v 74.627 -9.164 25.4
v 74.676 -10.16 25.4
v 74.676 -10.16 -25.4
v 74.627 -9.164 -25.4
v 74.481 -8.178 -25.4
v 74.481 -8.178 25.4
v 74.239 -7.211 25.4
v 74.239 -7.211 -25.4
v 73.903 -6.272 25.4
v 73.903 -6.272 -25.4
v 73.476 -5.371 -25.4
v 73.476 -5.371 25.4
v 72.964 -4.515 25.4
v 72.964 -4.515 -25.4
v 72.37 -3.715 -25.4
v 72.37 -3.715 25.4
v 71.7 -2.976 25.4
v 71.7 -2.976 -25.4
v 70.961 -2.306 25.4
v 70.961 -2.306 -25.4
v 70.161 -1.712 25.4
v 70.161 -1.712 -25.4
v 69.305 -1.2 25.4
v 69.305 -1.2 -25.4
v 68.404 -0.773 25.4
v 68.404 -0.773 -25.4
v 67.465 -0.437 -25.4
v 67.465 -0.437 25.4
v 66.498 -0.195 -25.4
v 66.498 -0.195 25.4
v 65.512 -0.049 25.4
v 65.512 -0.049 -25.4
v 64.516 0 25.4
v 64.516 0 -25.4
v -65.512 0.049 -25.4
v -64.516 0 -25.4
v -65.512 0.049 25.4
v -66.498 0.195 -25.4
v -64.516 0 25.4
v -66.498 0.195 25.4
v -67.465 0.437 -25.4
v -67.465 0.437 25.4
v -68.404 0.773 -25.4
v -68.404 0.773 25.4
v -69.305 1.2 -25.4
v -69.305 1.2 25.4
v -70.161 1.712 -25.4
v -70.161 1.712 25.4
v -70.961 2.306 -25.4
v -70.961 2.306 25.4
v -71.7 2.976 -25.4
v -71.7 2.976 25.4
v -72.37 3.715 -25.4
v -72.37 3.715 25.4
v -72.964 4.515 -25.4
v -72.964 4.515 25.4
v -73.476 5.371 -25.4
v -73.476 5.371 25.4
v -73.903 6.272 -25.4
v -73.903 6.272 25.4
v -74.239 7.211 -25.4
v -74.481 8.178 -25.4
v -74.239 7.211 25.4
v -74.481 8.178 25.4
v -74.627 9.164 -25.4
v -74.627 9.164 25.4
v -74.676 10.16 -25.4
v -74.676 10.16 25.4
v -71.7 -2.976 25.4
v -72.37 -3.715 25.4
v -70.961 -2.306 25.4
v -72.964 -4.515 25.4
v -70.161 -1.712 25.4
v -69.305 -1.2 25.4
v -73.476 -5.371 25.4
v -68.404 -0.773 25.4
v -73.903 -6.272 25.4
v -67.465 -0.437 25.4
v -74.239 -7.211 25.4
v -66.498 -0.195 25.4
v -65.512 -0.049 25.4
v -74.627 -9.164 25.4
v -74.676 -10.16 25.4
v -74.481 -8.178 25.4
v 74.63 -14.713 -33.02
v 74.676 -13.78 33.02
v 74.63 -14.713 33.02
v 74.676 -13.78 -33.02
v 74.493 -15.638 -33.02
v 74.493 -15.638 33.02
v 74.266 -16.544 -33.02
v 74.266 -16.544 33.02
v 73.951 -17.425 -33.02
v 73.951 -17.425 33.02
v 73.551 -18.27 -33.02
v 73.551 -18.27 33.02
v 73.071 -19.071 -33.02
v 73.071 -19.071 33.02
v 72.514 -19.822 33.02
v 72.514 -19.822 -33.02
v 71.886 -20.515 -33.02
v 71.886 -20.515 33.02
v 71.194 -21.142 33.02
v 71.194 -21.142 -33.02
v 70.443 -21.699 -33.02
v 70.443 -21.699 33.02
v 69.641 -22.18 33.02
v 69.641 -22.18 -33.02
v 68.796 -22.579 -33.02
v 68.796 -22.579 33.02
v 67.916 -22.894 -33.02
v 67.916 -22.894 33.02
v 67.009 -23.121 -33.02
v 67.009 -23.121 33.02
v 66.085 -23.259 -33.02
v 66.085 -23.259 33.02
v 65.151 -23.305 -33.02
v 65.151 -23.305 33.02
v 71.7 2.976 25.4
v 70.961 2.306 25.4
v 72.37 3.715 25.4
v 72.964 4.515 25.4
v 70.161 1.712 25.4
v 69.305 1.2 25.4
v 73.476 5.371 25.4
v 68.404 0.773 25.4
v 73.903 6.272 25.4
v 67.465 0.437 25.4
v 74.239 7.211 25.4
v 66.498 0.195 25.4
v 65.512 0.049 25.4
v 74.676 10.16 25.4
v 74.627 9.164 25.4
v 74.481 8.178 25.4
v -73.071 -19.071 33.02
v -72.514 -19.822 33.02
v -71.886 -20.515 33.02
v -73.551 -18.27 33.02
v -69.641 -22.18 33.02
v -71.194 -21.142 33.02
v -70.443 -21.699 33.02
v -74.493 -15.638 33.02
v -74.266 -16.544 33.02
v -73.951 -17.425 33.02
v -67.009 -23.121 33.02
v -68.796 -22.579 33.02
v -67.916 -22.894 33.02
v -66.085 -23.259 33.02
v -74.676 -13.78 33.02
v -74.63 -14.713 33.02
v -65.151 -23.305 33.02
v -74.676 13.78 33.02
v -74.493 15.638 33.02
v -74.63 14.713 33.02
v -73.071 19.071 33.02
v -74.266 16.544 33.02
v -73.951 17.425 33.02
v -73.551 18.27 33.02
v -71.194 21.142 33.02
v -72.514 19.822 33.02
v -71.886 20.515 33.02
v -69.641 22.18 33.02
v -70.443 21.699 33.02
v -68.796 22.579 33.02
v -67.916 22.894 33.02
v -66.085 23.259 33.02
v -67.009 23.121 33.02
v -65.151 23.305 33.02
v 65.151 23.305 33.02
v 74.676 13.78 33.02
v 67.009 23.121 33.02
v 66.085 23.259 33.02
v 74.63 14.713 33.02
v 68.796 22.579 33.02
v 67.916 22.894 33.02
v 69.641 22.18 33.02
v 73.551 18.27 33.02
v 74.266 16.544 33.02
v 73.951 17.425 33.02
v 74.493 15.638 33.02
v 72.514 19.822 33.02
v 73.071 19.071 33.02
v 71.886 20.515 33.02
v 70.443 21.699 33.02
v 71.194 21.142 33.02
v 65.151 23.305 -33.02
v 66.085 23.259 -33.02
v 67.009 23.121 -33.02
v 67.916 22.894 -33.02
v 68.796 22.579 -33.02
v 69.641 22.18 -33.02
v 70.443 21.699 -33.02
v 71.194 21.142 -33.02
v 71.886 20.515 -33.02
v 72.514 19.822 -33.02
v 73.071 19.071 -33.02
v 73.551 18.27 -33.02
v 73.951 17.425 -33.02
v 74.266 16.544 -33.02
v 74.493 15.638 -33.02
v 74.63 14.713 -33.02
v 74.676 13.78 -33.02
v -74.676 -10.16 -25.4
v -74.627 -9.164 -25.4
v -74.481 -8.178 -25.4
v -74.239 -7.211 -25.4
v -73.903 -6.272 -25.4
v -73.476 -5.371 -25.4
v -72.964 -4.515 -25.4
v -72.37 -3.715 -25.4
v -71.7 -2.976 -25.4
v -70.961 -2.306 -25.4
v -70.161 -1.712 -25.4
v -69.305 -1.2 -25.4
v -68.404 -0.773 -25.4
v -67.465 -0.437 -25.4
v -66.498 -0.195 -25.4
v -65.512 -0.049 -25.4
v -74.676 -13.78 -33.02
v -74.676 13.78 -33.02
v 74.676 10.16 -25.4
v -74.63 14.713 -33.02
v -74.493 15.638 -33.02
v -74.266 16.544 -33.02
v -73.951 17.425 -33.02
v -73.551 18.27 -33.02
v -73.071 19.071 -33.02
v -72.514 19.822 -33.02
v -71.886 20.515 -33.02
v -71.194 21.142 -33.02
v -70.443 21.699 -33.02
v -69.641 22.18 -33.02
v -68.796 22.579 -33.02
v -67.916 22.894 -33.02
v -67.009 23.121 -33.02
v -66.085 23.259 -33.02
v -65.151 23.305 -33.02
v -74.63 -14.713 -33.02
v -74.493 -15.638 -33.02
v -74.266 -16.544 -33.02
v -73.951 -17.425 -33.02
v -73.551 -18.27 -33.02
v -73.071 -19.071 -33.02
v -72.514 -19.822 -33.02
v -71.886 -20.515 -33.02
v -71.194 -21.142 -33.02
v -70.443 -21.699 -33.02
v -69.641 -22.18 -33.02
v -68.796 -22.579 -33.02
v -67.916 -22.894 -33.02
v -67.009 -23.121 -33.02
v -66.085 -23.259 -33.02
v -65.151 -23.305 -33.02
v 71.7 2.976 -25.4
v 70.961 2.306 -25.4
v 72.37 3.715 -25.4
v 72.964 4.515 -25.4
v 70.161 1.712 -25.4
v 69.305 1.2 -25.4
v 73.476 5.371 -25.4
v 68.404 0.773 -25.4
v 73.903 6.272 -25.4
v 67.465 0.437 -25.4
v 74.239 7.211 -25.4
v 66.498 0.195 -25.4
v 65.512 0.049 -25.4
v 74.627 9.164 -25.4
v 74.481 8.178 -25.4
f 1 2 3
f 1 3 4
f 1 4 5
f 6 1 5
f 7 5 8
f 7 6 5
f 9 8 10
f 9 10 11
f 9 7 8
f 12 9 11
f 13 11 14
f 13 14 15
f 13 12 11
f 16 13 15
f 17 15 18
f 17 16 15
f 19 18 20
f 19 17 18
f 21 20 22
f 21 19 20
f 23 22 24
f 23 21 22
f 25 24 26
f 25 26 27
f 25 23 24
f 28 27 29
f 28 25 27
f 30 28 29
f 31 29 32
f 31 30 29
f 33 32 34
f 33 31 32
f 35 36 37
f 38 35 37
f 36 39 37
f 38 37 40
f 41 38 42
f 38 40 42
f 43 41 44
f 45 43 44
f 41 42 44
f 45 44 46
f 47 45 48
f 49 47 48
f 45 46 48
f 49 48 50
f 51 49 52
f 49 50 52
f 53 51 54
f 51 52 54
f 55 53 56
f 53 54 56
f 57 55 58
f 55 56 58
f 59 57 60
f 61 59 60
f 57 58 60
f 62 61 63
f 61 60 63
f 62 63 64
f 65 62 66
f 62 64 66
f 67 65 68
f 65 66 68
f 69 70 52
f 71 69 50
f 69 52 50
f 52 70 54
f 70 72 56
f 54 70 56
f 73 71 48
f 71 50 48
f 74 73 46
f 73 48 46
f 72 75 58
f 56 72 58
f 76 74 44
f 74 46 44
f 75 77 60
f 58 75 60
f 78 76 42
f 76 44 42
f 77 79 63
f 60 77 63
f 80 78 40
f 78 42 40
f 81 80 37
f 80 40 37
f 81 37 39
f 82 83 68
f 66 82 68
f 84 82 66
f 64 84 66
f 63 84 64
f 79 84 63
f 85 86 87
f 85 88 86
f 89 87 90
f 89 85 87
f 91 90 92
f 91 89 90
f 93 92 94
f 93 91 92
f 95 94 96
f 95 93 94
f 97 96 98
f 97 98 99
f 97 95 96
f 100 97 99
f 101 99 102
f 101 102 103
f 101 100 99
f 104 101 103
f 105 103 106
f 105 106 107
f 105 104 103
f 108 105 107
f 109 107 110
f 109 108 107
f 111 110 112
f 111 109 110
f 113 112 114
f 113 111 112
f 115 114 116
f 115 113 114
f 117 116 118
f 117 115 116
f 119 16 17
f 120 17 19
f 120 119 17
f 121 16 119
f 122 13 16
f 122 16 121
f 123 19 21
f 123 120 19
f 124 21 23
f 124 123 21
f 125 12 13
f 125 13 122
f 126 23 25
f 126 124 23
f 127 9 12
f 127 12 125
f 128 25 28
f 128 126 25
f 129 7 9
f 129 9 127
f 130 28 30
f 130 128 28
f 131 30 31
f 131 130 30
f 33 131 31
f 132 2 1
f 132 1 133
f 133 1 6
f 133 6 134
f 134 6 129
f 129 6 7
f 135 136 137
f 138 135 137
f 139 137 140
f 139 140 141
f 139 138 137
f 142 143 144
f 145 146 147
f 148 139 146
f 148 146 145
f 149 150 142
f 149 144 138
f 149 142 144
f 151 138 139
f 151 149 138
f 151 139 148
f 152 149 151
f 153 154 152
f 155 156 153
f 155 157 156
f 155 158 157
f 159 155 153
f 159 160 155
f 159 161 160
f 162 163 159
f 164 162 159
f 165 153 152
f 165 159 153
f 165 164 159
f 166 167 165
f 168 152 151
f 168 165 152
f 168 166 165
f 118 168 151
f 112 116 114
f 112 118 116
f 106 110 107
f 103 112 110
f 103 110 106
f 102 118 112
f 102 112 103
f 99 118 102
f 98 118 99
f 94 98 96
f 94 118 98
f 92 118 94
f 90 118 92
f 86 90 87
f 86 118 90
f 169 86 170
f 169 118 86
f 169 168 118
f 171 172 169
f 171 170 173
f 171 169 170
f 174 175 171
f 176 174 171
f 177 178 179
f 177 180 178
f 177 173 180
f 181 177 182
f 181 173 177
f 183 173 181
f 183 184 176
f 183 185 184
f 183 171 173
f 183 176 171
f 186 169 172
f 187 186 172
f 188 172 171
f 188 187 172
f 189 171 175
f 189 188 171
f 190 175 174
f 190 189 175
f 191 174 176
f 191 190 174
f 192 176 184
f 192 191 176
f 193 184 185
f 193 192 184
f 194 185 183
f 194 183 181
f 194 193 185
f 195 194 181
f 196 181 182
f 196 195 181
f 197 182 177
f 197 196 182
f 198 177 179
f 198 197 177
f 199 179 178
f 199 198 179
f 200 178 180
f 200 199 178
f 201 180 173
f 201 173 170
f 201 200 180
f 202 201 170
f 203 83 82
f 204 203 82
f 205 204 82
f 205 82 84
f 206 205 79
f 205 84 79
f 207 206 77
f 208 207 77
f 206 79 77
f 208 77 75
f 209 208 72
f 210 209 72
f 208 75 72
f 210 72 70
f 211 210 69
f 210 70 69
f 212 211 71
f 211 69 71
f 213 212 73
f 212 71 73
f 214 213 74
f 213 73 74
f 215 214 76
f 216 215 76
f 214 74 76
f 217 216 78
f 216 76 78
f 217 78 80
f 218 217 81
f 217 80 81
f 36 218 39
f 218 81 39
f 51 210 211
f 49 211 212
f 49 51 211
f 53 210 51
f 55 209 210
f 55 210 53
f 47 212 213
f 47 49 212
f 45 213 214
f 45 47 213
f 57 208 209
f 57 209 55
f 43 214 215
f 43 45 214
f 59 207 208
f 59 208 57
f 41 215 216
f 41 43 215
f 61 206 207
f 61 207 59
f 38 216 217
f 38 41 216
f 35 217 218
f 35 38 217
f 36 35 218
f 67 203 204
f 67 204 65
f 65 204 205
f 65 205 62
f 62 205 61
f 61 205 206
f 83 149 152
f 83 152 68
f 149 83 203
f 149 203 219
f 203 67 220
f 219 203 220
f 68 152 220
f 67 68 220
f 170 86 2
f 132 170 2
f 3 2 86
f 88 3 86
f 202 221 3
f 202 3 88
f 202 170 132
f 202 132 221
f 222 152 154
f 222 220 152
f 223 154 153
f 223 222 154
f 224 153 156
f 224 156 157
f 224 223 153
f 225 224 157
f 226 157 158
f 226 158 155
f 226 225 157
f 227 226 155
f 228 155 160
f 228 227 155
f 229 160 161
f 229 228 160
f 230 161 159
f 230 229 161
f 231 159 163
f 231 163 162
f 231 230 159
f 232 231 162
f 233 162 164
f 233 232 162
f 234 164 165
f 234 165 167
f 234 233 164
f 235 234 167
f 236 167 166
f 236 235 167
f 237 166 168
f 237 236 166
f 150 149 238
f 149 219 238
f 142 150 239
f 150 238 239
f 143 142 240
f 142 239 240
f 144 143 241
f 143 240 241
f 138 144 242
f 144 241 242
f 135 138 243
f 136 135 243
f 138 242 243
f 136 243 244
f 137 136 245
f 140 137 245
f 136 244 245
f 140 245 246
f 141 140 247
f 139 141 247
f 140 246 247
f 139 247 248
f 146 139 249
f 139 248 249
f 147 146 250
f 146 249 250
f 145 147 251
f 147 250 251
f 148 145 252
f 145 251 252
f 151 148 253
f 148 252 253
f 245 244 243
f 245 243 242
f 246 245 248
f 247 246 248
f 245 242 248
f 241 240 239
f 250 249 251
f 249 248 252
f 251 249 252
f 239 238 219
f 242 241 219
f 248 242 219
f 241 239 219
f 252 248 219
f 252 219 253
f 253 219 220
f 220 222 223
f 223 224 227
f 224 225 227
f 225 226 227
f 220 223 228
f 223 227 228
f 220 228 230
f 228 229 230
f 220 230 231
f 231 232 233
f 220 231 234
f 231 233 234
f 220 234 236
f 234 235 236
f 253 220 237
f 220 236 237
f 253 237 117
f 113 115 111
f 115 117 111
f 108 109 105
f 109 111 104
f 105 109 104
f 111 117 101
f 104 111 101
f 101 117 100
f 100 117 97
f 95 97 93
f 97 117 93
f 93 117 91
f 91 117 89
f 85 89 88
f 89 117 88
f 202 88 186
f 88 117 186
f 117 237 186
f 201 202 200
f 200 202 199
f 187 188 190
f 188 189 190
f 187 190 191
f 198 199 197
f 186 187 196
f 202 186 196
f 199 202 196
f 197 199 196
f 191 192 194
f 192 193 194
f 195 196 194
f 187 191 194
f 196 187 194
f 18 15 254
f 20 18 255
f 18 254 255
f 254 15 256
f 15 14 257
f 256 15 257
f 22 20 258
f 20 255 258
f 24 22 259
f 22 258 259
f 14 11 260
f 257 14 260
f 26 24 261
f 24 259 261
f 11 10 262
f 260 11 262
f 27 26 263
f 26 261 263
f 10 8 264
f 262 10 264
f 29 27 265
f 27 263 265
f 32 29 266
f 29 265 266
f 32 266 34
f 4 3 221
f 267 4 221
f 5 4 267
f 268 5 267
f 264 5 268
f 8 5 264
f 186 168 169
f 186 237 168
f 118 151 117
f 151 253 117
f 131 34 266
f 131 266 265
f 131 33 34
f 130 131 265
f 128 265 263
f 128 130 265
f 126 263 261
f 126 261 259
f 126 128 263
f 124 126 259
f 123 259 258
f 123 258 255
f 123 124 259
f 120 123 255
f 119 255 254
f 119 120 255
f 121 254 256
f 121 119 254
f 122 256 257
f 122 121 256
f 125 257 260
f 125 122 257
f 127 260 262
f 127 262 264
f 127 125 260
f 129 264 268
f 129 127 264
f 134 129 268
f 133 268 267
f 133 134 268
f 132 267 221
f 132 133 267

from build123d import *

# Parameters (mm, degrees)
SKETCH1_W           = 149.352
SKETCH1_H           = 66.04
BOSS_EXTRUDE1_DEPTH = 23.3045
FILLET1_R           = 9.525
CUT_EXTRUDE1_DEPTH  = 25.4


with BuildPart() as part:
    # Sketch1 → Boss-Extrude1 (new, symmetric)
    with BuildSketch(Plane(origin=(0, 0, 0), x_dir=(1, 0, 0), z_dir=(0, 1, 0))):
        Rectangle(SKETCH1_W, SKETCH1_H)
    extrude(amount=BOSS_EXTRUDE1_DEPTH, both=True)

    # Fillet1
    fillet1_edges = [part.edges().sort_by_distance(p)[0] for p in [
        (74.676, 23.3045, 0),
        (-74.676, 23.3045, 0),
        (74.676, -23.3045, 0),
        (-74.676, -23.3045, 0),
    ]]
    fillet(fillet1_edges, radius=FILLET1_R)

    # Sketch2 → Cut-Extrude1 (cut, symmetric)
    with BuildSketch(Plane.XY):
        with BuildLine():
            Line((-74.676, 10.16), (-74.676, -10.16))
            ThreePointArc((-74.676, -10.16), (-71.700204897, -2.975795103), (-64.516, 0))
            ThreePointArc((-64.516, 0), (-71.700204897, 2.975795103), (-74.676, 10.16))
        make_face()
    cut_extrude1 = extrude(amount=CUT_EXTRUDE1_DEPTH, both=True, mode=Mode.SUBTRACT)

    # Mirror1: Cut-Extrude1 across plane
    add(cut_extrude1.mirror(Plane(origin=(0, 0, 0), x_dir=(0, 0, 1), z_dir=(1, 0, 0))), mode=Mode.SUBTRACT)


solid = part.part
